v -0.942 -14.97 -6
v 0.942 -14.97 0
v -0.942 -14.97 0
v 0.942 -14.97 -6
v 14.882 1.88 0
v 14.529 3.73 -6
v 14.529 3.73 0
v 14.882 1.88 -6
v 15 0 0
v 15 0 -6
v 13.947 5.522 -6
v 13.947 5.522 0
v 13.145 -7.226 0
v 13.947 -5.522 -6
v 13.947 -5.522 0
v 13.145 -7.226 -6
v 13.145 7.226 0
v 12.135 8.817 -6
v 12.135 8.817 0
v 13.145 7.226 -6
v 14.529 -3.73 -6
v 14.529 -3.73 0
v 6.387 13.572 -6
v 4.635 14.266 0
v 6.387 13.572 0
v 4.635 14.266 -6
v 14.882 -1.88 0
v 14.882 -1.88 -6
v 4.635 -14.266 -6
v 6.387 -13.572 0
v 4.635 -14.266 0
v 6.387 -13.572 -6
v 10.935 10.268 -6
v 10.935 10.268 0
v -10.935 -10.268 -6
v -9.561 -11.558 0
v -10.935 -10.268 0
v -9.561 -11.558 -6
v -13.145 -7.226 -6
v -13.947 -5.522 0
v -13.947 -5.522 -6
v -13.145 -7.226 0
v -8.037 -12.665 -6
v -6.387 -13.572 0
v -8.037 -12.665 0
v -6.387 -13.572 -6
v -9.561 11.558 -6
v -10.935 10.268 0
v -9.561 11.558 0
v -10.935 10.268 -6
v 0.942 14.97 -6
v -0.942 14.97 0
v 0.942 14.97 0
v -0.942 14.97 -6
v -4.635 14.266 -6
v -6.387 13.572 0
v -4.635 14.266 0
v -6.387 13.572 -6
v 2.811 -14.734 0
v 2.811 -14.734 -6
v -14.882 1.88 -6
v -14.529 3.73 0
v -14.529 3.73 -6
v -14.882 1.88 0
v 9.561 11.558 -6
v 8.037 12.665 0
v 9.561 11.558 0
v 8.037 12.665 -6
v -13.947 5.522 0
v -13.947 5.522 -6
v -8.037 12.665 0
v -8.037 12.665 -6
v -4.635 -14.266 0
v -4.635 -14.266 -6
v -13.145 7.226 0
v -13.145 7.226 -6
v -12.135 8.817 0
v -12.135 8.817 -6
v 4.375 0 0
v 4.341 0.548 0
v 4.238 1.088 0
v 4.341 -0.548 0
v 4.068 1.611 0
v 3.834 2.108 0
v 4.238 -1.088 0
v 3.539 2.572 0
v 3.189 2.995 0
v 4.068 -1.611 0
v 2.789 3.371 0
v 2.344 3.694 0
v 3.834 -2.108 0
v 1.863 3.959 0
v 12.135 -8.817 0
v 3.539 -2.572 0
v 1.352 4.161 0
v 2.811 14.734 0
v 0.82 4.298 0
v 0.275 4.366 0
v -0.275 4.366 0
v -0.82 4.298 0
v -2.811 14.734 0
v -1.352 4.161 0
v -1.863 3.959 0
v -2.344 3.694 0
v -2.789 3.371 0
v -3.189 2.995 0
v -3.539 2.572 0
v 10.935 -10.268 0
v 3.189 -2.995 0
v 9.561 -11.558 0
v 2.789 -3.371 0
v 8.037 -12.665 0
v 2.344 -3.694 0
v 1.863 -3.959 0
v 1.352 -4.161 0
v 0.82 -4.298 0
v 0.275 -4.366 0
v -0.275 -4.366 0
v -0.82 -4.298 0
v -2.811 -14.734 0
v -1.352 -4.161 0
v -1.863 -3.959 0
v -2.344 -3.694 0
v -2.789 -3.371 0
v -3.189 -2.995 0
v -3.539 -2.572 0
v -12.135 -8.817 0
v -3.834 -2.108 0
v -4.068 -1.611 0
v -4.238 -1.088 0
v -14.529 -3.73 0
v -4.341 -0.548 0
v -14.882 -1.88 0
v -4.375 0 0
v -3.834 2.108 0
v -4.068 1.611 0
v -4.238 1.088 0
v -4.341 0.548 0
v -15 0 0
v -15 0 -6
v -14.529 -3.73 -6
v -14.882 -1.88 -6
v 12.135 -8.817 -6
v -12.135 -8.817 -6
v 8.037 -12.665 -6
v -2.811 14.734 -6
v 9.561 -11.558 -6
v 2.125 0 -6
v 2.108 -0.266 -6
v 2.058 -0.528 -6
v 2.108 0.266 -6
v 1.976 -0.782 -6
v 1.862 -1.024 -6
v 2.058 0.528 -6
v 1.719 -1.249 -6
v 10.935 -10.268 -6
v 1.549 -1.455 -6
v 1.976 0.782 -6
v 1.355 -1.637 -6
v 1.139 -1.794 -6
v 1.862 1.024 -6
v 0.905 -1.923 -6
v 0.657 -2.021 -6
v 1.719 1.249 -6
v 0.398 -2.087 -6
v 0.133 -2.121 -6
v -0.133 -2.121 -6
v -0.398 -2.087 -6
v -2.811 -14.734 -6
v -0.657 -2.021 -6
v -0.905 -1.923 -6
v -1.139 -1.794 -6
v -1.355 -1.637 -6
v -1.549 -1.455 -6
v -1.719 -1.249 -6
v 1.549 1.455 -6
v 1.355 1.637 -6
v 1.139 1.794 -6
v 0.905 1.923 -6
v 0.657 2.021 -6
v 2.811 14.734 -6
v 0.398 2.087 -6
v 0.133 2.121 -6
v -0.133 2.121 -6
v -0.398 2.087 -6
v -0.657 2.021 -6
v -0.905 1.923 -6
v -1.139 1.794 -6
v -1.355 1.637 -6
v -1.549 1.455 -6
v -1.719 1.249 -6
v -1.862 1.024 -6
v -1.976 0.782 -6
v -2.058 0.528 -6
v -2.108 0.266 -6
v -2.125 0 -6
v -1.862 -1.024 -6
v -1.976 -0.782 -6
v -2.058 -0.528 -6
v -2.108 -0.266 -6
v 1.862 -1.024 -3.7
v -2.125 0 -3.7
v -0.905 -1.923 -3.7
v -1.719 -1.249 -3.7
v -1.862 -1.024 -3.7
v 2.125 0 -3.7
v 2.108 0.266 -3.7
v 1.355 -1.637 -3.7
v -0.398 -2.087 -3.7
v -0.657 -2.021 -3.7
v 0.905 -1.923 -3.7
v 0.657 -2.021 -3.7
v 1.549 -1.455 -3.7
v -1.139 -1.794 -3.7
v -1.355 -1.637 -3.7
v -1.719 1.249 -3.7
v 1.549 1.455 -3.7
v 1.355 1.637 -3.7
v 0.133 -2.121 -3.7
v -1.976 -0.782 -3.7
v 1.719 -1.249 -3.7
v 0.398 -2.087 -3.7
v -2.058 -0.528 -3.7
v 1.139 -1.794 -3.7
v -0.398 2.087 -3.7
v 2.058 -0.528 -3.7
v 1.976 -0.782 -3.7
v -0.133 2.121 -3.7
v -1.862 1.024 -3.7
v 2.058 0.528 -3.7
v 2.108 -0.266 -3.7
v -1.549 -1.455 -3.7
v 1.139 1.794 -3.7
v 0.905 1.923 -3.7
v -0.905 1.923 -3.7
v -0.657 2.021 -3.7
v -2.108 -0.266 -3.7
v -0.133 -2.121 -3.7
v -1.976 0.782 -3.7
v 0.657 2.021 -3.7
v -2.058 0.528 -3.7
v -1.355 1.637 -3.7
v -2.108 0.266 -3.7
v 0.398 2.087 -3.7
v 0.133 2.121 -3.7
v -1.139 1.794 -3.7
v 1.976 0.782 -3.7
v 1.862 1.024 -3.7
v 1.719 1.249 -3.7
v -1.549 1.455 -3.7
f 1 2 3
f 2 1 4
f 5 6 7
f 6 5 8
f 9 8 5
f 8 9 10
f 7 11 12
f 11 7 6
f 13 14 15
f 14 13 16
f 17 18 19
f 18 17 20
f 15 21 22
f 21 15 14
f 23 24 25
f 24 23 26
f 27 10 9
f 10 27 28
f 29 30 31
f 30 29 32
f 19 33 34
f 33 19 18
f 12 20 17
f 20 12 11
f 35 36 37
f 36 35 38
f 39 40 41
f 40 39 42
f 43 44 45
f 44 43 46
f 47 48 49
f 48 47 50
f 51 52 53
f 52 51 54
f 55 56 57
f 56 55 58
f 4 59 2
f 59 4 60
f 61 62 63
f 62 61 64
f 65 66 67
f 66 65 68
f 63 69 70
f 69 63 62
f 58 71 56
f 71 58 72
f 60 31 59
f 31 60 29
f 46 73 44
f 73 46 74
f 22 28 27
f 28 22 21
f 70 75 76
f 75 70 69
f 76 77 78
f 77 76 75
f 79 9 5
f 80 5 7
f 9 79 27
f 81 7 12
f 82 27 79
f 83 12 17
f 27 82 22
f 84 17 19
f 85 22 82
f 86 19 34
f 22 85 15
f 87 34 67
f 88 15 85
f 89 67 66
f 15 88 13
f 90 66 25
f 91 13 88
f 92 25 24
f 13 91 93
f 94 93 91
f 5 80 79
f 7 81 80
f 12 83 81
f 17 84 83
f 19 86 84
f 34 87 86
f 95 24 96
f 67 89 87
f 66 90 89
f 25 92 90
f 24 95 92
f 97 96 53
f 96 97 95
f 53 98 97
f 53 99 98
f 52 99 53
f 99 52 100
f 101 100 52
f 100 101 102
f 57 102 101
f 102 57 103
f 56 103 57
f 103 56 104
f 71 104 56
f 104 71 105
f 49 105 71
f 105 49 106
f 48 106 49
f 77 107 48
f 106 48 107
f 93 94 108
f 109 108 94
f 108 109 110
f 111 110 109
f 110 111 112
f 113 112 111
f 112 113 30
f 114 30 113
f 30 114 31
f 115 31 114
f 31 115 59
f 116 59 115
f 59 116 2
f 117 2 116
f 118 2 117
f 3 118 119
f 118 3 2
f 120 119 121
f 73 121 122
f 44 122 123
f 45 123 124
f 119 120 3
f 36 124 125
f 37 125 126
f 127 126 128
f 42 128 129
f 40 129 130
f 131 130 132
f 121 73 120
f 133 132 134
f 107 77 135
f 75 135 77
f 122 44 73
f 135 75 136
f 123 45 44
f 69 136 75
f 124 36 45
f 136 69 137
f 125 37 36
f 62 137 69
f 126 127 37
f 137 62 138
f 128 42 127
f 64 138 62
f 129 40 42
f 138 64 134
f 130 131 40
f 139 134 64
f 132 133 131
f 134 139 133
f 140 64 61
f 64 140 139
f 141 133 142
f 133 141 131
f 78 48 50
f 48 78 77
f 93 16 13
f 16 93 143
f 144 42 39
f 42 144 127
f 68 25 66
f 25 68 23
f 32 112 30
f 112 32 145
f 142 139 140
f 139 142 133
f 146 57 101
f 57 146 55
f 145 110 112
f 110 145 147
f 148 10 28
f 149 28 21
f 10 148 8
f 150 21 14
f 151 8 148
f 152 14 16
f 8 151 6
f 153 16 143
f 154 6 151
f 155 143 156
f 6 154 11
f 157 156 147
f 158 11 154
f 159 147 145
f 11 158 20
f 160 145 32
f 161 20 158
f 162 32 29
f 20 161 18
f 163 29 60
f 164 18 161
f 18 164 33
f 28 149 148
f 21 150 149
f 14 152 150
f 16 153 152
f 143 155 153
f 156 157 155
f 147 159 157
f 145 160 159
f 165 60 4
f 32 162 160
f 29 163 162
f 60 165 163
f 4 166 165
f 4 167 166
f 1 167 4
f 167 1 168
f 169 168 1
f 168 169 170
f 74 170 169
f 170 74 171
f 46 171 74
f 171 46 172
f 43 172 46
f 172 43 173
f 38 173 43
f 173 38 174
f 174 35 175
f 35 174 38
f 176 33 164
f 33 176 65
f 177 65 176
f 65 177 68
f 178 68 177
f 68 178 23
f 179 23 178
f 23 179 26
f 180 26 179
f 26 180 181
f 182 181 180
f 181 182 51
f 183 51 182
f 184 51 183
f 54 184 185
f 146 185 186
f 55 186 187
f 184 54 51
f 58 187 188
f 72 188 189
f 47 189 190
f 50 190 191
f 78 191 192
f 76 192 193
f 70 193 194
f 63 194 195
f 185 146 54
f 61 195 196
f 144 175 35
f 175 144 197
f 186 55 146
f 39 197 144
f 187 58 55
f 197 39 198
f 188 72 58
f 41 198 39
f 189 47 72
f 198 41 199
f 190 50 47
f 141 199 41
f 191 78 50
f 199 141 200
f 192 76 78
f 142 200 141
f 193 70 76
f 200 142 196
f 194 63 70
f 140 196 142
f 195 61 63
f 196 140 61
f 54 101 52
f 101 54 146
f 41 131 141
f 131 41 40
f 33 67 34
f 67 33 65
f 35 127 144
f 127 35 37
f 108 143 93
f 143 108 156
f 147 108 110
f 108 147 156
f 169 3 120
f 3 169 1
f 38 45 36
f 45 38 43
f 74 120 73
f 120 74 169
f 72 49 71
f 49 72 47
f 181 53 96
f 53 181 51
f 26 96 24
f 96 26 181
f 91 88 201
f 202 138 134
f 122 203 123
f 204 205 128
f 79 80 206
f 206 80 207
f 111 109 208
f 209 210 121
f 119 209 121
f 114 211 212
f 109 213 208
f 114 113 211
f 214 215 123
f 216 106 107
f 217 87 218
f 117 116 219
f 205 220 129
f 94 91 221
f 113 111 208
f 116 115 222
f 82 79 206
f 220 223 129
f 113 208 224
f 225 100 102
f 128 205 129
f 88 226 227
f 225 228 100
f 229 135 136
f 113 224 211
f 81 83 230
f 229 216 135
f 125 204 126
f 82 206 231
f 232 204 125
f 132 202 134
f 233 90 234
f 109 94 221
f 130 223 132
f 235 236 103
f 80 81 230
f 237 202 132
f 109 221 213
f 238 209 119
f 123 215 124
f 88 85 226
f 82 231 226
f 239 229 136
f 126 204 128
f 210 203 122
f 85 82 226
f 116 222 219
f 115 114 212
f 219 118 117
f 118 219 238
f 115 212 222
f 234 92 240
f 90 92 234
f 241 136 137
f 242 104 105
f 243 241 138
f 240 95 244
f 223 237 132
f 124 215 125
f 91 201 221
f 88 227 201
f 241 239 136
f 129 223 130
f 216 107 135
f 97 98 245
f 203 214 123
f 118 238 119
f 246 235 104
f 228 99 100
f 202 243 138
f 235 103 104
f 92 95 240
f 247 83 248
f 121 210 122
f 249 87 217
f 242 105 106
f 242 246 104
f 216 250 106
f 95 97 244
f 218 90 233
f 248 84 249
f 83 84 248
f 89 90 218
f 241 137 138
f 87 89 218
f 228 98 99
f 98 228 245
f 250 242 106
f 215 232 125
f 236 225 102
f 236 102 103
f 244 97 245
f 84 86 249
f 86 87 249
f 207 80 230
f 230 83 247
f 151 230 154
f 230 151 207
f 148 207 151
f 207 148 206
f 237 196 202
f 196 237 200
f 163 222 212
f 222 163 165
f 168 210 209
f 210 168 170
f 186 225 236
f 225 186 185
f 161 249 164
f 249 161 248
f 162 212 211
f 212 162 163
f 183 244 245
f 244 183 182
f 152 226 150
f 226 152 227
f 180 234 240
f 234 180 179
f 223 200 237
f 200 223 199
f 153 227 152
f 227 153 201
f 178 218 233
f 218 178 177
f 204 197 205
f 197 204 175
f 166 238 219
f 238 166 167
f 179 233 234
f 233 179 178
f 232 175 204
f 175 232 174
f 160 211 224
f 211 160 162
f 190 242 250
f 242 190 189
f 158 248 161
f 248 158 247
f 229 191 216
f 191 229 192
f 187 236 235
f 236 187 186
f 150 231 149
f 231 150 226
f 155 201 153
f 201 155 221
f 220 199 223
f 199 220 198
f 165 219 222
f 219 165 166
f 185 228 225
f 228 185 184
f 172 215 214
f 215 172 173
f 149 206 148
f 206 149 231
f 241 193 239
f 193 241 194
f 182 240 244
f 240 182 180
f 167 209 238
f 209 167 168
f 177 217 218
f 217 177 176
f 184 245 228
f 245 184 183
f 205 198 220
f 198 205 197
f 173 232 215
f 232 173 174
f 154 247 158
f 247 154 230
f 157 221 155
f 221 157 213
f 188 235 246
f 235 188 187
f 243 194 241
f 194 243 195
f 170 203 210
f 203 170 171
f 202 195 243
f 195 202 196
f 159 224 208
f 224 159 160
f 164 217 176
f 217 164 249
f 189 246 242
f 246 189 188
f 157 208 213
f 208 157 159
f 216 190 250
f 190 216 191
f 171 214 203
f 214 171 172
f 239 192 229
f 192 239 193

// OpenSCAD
$fn = 50;


difference() {
	union() {
		translate(v = [0, 0, -6.0000000000]) {
			cylinder(h = 6, r = 15.0000000000);
		}
		translate(v = [0, 0, -6.0000000000]) {
			cylinder(h = 6, r = 2.8750000000);
		}
	}
	union() {
		translate(v = [0, 0, 0]) {
			rotate(a = [0, 0, 0]) {
				difference() {
					union() {
						translate(v = [0, 0, -6.0000000000]) {
							cylinder(h = 6, r = 2.0000000000);
						}
						translate(v = [0, 0, -3.7000000000]) {
							cylinder(h = 3.7000000000, r1 = 2.1250000000, r2 = 4.3750000000);
						}
						translate(v = [0, 0, -6.0000000000]) {
							cylinder(h = 6, r = 2.1250000000);
						}
						translate(v = [0, 0, -6.0000000000]) {
							cylinder(h = 6, r = 2.0000000000);
						}
					}
					union();
				}
			}
		}
	}
}
